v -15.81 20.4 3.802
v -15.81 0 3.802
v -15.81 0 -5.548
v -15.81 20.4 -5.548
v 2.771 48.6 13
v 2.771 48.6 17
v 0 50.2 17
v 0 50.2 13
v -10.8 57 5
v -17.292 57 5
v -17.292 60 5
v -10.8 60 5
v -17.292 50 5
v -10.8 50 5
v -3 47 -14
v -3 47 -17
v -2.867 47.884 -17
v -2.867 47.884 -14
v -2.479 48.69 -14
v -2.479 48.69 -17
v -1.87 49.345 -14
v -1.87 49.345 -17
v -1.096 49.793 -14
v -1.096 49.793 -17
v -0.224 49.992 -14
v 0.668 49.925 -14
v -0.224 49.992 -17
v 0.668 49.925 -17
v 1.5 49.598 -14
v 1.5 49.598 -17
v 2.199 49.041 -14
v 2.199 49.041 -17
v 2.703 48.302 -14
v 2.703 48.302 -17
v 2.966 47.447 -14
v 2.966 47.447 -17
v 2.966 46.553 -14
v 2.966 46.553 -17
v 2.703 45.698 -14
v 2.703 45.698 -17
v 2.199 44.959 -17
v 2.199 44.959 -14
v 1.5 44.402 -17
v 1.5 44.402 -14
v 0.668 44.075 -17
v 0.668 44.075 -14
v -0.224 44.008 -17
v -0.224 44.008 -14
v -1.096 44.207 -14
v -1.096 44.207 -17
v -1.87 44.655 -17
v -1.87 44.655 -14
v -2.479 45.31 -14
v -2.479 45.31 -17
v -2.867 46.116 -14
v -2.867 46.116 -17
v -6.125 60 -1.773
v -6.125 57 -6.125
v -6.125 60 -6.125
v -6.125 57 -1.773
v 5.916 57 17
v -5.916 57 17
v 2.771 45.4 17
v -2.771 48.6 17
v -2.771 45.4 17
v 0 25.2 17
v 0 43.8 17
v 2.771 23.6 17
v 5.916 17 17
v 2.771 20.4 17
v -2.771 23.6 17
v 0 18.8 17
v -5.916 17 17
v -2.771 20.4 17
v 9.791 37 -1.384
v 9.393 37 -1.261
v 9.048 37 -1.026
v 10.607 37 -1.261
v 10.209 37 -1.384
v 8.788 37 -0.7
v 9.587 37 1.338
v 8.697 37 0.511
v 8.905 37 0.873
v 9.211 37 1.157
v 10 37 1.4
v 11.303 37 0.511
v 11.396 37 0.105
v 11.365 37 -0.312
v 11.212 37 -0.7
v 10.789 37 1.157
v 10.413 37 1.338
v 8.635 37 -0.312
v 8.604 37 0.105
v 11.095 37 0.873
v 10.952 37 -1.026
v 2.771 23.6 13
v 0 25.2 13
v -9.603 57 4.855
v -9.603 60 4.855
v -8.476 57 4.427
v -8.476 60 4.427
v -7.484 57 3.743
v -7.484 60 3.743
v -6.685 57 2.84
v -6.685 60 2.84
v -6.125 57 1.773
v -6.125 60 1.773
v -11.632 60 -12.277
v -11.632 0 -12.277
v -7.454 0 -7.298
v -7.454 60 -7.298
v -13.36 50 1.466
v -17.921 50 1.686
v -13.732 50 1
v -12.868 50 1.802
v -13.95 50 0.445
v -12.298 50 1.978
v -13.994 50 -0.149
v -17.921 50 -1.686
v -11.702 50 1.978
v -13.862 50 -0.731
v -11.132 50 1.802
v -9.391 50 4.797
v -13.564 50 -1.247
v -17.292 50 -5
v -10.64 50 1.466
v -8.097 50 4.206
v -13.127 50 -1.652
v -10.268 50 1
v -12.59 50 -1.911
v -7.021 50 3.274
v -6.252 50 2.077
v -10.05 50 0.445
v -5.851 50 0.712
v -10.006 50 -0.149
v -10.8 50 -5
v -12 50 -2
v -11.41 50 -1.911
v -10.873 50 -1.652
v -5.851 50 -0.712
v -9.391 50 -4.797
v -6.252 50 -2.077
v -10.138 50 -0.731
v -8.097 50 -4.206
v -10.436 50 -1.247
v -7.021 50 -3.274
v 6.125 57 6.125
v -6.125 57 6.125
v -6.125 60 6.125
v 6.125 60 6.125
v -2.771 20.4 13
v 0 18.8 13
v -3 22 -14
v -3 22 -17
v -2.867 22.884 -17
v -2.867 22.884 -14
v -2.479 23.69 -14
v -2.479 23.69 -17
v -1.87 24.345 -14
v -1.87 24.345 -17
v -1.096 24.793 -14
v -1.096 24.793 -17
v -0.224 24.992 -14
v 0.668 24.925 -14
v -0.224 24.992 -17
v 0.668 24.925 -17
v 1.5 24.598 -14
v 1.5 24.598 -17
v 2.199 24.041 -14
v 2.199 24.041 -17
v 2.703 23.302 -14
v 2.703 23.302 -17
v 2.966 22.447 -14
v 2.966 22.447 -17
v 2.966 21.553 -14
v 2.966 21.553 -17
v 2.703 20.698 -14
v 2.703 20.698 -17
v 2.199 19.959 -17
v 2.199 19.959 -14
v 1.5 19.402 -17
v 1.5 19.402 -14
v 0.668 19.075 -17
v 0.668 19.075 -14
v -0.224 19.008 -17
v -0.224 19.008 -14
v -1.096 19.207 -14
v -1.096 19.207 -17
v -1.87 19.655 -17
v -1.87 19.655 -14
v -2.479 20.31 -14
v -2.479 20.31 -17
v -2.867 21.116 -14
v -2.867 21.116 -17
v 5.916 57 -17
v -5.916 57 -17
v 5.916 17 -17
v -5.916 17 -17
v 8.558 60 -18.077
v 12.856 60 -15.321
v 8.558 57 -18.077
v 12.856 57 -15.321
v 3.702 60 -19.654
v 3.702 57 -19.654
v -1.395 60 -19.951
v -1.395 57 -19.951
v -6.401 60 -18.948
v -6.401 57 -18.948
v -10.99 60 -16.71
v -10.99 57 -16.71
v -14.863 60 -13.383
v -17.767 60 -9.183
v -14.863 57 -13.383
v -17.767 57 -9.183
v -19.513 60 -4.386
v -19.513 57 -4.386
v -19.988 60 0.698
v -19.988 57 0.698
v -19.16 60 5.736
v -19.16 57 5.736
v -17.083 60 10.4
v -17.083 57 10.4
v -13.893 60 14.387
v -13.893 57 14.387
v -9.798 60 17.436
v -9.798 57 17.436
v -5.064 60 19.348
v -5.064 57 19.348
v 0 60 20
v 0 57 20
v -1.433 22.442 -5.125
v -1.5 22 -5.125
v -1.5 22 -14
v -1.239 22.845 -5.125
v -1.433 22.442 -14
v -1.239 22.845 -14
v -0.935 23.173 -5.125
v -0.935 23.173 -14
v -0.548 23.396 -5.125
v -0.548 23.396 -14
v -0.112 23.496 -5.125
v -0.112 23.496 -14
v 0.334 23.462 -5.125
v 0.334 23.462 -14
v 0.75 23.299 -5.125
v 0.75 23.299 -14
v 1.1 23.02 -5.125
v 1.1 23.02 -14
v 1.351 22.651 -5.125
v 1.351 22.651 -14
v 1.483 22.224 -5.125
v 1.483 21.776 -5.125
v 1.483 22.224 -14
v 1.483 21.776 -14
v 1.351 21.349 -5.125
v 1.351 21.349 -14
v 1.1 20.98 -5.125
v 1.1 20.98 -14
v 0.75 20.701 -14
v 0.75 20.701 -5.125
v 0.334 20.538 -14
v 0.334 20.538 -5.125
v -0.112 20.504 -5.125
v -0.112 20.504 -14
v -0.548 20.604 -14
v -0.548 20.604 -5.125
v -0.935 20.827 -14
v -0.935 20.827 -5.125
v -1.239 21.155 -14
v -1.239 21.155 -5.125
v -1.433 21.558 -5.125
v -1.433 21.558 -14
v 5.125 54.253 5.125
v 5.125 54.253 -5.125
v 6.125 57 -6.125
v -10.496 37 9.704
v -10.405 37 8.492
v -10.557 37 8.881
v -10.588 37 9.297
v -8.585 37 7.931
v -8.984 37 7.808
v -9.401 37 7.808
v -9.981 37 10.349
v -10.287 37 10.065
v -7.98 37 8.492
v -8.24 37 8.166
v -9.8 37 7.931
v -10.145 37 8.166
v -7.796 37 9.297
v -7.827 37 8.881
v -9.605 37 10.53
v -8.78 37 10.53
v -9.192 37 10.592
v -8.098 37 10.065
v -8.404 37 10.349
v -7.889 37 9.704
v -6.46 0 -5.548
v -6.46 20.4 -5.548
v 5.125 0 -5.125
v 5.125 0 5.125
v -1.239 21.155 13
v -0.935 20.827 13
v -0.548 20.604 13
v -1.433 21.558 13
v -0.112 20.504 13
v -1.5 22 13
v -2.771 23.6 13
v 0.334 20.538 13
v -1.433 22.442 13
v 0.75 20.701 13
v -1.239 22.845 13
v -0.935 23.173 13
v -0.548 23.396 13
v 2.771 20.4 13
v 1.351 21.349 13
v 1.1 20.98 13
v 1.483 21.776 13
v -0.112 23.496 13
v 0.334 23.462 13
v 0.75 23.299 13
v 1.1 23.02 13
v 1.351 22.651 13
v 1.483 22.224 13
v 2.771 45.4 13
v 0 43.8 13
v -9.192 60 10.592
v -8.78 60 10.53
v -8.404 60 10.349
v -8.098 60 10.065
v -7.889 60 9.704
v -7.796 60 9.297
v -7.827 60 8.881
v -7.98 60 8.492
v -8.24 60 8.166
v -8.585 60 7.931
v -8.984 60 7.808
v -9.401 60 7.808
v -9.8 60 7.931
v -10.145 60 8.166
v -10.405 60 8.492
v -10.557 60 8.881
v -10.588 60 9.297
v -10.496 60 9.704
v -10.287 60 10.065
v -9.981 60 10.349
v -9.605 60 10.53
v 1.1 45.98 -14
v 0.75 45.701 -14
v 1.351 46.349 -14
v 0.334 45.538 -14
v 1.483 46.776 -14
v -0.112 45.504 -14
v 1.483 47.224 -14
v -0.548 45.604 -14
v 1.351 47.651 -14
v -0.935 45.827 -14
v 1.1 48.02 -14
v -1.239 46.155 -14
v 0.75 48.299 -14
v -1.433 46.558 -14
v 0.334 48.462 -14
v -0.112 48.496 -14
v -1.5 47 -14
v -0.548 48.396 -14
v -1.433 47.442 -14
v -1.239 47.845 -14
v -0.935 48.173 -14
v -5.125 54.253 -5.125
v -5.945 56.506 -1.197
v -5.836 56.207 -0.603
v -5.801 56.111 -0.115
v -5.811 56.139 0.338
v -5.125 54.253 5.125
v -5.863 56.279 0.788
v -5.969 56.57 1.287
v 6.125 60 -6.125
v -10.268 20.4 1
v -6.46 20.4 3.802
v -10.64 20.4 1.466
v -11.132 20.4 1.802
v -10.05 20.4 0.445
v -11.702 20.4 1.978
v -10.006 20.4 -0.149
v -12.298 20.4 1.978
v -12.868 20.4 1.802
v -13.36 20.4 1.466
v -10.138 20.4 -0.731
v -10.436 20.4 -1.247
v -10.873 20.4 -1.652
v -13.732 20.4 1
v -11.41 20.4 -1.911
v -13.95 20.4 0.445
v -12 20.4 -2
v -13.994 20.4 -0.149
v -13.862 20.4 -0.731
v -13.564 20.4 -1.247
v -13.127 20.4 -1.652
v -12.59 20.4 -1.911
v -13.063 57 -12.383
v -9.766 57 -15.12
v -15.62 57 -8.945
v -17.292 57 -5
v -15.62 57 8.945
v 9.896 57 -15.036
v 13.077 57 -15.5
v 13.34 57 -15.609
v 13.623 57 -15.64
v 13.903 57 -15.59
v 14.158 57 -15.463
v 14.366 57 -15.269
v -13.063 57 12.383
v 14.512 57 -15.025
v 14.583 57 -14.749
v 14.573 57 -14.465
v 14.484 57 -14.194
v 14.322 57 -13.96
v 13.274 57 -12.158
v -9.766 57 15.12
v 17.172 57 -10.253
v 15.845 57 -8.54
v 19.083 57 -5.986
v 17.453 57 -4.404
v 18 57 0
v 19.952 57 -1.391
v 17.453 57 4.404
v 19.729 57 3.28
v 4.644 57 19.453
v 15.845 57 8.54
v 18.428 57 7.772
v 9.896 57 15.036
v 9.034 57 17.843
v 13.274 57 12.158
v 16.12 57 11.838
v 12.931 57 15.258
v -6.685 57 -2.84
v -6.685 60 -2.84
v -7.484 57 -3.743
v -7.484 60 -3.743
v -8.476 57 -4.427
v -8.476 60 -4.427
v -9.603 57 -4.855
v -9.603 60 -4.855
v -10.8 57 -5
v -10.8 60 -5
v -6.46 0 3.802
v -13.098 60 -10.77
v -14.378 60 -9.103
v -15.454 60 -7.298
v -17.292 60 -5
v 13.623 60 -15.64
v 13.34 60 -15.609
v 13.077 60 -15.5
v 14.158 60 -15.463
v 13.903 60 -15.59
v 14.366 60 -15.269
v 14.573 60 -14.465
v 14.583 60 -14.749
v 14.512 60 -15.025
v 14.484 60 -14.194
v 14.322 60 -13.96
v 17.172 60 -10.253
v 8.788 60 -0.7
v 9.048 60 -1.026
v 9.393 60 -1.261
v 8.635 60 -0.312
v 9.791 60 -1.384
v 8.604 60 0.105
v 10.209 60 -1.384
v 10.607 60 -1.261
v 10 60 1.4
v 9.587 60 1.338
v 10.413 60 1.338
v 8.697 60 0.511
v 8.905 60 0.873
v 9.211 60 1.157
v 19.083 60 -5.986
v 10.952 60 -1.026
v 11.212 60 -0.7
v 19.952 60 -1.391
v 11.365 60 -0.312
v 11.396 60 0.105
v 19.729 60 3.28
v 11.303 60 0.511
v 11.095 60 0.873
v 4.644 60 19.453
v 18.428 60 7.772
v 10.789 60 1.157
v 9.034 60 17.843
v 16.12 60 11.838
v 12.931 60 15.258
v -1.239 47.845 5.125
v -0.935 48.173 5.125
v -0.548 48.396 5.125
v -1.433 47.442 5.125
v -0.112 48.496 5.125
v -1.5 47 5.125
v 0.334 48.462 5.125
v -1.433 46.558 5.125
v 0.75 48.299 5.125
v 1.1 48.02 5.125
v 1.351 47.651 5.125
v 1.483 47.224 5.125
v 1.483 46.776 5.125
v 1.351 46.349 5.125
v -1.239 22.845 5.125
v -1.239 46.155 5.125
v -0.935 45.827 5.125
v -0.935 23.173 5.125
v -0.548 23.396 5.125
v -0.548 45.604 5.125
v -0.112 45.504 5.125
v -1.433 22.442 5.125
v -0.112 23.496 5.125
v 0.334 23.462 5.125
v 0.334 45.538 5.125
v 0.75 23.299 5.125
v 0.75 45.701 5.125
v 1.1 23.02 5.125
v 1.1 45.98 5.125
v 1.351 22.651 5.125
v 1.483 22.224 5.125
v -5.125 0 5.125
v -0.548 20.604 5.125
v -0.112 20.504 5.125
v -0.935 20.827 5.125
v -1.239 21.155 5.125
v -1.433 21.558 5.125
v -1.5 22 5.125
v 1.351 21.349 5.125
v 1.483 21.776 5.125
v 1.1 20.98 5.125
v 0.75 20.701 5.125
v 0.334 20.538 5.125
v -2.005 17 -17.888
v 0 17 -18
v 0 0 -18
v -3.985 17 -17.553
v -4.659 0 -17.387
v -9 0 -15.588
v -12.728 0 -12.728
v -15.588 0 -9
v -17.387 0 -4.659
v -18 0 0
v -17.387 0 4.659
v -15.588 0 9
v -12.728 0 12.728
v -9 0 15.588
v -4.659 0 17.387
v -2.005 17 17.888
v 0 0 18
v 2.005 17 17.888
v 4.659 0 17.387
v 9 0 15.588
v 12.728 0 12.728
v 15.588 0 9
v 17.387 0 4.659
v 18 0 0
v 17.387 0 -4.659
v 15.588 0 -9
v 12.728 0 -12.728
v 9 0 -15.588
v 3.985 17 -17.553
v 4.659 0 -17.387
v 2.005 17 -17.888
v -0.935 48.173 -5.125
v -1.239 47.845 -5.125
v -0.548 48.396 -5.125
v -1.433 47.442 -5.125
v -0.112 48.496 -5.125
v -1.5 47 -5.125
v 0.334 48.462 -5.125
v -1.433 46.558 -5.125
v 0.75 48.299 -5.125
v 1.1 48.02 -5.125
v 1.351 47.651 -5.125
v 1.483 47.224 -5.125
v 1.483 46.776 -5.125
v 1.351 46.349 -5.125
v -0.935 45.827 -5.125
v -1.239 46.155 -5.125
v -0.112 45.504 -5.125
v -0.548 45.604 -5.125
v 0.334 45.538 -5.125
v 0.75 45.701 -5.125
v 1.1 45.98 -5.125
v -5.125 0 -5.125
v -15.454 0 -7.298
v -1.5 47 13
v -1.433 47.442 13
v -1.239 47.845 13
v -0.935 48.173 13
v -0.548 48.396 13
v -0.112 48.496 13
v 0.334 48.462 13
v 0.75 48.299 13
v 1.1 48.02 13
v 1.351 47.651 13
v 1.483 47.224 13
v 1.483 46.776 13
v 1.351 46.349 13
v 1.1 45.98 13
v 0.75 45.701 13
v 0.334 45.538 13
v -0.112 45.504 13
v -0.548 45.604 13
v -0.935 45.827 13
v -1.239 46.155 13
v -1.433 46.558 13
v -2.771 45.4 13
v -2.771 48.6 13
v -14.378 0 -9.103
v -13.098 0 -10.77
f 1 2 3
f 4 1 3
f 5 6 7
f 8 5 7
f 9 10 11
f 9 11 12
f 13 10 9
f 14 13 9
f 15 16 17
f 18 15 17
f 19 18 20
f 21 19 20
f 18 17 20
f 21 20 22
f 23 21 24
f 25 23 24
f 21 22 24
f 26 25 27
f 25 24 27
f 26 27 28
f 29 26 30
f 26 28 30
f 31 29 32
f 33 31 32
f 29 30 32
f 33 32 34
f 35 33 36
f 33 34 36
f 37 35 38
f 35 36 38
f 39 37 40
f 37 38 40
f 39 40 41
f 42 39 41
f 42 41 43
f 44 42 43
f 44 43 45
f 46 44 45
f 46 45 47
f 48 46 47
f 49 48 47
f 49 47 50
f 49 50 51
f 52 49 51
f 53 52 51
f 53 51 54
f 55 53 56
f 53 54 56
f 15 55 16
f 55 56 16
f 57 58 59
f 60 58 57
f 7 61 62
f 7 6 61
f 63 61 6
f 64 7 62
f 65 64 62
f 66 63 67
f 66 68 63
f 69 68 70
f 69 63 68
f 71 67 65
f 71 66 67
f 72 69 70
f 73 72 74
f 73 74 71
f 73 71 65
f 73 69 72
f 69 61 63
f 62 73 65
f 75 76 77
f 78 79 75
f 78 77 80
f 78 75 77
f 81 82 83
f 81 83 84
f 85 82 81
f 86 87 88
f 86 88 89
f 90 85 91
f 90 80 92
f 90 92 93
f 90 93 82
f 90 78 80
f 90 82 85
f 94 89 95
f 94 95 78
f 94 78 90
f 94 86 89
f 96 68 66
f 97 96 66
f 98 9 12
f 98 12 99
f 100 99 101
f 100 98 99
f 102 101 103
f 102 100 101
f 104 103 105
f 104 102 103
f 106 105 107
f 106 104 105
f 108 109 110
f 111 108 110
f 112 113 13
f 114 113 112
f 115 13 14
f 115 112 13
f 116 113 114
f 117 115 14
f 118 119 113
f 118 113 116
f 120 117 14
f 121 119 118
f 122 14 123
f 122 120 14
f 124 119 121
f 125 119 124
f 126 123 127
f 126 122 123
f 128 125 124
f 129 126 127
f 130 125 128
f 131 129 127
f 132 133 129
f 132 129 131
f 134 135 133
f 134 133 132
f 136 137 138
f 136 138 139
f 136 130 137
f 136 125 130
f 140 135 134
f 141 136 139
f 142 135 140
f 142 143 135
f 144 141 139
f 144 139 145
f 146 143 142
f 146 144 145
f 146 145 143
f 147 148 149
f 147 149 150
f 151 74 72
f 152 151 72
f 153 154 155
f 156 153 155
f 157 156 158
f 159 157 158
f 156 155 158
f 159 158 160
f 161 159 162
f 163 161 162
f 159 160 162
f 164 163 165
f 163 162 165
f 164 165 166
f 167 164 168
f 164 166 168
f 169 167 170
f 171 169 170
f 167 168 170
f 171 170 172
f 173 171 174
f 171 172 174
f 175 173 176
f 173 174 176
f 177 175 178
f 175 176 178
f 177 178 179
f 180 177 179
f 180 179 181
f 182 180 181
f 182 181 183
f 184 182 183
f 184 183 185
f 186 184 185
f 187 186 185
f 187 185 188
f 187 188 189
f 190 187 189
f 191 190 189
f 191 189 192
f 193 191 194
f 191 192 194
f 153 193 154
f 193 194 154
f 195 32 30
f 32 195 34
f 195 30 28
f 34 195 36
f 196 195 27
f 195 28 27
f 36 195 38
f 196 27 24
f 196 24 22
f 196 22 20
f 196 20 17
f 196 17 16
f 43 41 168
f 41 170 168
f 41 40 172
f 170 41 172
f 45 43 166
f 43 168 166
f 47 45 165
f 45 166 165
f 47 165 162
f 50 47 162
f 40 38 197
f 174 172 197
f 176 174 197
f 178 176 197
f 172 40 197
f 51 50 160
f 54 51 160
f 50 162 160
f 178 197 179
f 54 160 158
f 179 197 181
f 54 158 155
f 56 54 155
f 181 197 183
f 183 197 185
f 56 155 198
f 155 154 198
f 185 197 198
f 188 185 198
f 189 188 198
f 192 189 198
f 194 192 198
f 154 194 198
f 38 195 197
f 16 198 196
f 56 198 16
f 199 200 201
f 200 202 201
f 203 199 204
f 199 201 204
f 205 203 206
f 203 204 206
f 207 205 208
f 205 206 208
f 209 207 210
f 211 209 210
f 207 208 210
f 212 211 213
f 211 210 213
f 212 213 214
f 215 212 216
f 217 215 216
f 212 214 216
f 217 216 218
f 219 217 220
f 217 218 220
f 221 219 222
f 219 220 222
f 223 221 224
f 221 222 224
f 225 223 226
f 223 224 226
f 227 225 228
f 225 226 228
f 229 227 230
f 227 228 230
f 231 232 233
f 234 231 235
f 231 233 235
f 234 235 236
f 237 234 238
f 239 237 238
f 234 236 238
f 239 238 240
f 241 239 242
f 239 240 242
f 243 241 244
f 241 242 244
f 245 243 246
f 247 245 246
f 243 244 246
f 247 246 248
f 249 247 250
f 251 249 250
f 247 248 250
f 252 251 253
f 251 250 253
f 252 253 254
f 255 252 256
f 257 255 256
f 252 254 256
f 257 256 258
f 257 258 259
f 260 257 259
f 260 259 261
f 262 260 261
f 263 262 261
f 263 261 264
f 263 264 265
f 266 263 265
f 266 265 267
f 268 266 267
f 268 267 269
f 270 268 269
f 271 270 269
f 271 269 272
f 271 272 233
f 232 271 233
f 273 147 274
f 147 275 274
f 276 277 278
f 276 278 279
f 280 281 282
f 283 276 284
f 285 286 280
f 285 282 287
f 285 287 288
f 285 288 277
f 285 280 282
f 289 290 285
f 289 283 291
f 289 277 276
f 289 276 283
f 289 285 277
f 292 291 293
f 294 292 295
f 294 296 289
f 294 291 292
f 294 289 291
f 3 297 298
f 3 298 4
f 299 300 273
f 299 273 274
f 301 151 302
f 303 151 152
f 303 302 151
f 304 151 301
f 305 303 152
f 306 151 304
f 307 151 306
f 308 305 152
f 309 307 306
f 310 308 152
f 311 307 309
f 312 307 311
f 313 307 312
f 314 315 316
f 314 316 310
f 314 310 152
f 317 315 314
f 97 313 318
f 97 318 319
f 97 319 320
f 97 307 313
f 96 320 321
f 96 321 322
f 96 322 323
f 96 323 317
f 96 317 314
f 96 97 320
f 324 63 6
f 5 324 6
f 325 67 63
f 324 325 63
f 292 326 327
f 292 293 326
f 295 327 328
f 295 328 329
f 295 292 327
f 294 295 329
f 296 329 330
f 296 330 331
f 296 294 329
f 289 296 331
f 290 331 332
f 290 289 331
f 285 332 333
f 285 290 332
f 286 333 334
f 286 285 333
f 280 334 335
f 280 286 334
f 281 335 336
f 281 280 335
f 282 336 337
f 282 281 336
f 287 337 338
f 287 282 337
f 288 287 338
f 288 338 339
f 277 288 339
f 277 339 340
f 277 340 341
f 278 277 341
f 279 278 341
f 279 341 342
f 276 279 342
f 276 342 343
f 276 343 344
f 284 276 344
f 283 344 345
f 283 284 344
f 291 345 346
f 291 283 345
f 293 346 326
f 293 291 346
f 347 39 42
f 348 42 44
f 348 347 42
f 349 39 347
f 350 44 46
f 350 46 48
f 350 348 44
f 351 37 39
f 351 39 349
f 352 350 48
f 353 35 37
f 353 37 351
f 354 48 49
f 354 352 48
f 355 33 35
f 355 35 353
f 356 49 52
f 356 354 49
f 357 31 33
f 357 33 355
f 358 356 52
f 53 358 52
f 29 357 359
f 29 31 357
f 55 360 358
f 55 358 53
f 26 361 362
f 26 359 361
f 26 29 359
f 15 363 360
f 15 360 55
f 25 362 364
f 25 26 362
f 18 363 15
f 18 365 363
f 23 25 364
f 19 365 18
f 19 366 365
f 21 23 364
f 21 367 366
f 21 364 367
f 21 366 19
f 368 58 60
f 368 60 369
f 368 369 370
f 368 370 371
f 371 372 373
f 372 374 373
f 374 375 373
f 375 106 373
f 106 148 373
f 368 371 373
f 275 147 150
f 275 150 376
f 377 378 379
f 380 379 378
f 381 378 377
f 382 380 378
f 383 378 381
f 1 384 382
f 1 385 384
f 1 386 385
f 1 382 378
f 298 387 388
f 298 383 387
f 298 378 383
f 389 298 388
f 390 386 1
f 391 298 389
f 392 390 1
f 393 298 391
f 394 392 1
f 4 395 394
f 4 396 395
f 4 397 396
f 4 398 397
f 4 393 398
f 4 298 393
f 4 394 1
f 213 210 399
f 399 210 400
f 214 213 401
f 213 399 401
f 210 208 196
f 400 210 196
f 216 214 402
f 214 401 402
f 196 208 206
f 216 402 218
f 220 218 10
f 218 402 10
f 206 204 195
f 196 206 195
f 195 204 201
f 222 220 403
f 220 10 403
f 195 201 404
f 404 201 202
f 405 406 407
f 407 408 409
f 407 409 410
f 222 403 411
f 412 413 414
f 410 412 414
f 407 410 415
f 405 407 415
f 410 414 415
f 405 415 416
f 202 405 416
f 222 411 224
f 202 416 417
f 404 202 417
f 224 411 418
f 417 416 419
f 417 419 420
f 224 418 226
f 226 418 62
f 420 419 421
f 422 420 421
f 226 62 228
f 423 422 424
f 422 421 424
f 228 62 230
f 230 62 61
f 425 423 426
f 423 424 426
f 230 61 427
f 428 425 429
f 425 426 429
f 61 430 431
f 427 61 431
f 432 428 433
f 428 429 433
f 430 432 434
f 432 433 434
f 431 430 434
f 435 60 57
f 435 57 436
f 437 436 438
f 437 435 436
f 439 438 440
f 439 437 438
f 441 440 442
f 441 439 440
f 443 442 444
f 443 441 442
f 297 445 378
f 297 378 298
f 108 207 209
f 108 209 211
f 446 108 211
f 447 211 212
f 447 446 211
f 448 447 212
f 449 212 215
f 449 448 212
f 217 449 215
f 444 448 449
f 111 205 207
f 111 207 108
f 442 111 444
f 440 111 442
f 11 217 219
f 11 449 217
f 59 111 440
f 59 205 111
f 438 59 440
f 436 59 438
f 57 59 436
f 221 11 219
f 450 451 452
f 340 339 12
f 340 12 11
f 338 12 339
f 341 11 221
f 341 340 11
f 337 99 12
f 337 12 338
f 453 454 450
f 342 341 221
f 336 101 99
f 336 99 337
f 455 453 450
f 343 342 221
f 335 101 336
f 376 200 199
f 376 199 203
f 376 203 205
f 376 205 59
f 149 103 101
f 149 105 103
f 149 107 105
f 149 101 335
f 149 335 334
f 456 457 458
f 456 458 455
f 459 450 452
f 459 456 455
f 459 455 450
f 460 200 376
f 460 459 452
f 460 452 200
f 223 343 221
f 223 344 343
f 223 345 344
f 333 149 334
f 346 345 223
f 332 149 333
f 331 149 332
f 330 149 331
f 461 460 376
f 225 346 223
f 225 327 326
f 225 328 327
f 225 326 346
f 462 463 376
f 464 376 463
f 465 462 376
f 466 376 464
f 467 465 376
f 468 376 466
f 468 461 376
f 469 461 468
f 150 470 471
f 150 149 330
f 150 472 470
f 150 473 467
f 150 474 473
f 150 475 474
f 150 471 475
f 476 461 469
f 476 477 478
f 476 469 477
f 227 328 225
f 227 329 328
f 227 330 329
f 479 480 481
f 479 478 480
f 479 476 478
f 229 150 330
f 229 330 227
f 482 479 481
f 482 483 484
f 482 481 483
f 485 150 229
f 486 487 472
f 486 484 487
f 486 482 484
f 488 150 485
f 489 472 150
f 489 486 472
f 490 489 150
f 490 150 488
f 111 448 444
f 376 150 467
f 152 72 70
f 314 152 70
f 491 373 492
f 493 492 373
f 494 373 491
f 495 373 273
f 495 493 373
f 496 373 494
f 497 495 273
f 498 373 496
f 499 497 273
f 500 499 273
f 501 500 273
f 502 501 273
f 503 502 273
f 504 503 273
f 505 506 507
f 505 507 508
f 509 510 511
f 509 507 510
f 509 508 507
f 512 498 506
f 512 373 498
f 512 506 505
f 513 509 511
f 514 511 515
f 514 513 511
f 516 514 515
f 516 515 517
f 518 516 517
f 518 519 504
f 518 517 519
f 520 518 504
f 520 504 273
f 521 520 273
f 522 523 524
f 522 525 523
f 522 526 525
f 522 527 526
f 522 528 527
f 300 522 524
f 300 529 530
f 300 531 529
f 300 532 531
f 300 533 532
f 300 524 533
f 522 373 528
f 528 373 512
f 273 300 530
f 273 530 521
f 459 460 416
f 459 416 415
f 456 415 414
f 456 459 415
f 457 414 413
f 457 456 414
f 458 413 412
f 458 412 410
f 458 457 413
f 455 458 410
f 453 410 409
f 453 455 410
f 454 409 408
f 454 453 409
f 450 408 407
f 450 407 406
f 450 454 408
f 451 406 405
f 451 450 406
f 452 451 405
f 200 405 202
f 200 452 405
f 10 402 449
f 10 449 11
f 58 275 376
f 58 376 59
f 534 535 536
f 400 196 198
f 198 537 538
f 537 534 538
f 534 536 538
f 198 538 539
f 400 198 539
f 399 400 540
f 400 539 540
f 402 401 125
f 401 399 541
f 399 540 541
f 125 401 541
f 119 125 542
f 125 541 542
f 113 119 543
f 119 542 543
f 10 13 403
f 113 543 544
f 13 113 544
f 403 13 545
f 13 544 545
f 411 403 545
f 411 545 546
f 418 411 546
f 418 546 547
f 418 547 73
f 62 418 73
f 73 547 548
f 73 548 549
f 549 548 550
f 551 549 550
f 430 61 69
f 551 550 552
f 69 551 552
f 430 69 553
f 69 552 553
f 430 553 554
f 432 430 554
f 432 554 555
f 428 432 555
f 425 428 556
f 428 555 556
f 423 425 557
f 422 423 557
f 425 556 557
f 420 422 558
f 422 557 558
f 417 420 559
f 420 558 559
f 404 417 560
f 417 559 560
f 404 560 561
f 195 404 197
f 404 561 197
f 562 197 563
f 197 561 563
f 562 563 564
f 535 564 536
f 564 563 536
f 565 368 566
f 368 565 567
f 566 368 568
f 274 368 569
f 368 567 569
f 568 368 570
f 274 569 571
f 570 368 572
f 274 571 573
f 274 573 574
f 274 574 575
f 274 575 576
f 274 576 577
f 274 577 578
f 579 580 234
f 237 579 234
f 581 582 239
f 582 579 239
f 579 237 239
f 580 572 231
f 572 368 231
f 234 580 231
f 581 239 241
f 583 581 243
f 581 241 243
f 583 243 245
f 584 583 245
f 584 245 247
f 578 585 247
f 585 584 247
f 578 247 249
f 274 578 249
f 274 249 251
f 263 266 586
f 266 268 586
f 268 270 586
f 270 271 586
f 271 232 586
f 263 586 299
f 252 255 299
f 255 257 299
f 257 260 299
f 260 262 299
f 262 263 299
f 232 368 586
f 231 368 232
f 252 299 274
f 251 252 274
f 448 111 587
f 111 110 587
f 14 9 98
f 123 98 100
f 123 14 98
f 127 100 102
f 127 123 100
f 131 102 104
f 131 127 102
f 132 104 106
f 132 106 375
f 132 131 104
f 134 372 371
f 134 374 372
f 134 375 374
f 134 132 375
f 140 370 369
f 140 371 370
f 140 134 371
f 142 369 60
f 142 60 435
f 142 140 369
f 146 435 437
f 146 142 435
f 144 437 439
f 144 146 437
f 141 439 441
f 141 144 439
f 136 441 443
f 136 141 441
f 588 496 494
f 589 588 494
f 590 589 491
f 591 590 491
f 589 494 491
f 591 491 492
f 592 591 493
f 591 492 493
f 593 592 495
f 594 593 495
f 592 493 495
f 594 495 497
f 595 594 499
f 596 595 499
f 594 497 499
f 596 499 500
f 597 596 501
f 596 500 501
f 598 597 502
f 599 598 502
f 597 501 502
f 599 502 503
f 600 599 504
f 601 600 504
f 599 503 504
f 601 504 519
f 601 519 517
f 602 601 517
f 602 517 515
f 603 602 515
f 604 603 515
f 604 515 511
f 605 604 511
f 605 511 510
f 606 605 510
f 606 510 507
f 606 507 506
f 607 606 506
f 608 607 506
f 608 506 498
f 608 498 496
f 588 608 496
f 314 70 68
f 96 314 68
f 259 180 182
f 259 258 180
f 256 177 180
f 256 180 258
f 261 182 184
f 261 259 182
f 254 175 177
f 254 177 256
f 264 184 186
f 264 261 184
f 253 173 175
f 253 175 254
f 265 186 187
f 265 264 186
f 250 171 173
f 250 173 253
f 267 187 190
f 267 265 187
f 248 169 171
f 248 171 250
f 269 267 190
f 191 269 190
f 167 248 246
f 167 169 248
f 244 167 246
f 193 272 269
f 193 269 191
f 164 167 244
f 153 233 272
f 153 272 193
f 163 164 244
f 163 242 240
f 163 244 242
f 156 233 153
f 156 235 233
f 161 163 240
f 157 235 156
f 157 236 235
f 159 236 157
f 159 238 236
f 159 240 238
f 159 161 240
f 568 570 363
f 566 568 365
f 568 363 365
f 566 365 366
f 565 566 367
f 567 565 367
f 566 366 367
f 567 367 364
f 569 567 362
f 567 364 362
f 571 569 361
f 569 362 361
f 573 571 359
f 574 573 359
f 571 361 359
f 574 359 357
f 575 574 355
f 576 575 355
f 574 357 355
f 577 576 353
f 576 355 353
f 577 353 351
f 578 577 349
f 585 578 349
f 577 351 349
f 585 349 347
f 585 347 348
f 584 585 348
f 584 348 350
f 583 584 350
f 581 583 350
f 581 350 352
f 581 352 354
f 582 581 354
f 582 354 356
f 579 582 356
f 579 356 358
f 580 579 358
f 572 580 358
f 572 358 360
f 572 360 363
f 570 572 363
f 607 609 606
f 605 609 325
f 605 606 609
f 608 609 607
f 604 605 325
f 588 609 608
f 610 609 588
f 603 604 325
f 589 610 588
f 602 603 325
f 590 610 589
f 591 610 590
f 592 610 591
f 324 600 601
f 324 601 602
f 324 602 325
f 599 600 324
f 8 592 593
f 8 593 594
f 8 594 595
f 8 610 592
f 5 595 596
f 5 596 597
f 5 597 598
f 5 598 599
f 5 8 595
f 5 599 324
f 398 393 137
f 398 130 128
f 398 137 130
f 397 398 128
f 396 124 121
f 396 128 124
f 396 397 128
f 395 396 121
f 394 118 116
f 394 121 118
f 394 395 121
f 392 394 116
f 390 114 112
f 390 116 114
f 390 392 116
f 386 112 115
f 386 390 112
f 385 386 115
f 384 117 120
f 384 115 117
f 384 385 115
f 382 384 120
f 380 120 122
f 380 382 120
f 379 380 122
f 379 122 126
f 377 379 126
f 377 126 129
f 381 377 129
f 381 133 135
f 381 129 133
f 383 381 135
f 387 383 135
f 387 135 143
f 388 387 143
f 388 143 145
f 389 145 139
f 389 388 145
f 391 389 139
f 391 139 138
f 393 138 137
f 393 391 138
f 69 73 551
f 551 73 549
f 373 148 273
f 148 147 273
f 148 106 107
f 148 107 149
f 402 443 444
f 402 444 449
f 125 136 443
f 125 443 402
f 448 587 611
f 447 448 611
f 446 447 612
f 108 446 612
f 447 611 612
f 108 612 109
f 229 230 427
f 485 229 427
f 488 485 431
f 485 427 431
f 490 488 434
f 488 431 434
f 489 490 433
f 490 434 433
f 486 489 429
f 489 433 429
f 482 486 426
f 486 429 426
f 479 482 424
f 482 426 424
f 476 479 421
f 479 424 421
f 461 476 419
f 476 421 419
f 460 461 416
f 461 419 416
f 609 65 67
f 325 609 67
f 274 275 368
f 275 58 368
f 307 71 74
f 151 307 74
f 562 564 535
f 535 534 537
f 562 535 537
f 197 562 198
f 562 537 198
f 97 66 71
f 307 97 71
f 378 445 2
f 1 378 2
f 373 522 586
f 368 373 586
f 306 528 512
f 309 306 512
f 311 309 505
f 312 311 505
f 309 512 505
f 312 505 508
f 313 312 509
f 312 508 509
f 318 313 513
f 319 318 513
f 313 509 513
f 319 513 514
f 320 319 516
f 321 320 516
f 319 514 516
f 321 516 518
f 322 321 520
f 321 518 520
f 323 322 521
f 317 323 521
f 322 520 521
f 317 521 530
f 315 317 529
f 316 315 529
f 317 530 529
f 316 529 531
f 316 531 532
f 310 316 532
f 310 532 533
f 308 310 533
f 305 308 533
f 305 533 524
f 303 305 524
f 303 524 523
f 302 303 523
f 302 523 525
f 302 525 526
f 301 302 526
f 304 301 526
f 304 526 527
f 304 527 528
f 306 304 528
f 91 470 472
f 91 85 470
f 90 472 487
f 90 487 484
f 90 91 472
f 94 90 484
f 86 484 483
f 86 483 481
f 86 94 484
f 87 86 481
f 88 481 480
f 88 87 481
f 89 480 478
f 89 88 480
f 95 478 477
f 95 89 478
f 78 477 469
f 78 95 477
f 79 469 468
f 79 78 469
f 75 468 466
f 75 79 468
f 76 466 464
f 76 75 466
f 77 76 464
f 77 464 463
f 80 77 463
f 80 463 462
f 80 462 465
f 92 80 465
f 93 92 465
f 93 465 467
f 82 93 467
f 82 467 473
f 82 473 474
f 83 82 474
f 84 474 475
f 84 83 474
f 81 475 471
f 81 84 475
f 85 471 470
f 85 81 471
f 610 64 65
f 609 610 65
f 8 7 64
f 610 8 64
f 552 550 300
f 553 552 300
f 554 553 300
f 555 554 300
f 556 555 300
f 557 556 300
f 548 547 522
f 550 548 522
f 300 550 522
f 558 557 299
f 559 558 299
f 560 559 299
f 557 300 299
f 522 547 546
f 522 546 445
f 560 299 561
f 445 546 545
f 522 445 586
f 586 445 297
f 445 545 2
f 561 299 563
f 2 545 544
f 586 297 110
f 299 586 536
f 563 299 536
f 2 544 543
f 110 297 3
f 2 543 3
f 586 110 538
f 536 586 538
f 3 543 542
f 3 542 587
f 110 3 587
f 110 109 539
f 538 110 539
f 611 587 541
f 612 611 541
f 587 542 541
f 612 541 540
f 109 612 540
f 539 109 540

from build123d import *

# Parameters (mm, degrees)
SKETCH1_R           = 18
SKETCH1_R_2         = 2
SKETCH1_W           = 10.25
SKETCH1_H           = 10.25
BOSS_EXTRUDE1_DEPTH = 57
CUT_EXTRUDE1_START  = -7
CUT_EXTRUDE1_DEPTH  = 7
SKETCH4_W           = 9.35
SKETCH4_H           = 9.35
CUT_EXTRUDE3_DEPTH  = 20.4
CUT_EXTRUDE4_START  = -40
CUT_EXTRUDE4_DEPTH  = 40
SKETCH6_R           = 1.5
CUT_EXTRUDE5_DEPTH  = 70.267597042
SKETCH7_R           = 3
CUT_EXTRUDE6_DEPTH  = 3
CUT_EXTRUDE7_DEPTH  = 4
CHAMFER1_SIZE       = 1
CHAMFER1_SIZE_2     = 2.747477419
CUT_EXTRUDE8_DEPTH  = 63.42595614
SKETCH12_R          = 1.4
CUT_EXTRUDE10_DEPTH = 20
SKETCH13_R          = 20
SKETCH13_R_2        = 1.4
BOSS_EXTRUDE2_DEPTH = 3
BOSS_EXTRUDE3_DEPTH = 3


with BuildPart() as part:
    # Sketch1 → Boss-Extrude1 (new body)
    with BuildSketch(Plane(origin=(0, 0, 0), x_dir=(1, 0, 0), z_dir=(0, 1, 0))):
        with Locations(Location((0, 0, 0), (0, 0, 90))):
            Circle(SKETCH1_R)
        with Locations(Location((-12, 0, 0), (0, 0, 90))):
            Circle(SKETCH1_R_2, mode=Mode.SUBTRACT)
        Rectangle(SKETCH1_W, SKETCH1_H, mode=Mode.SUBTRACT)
    extrude(amount=BOSS_EXTRUDE1_DEPTH)

    # Sketch2 → Cut-Extrude1 (cut)
    with BuildSketch(Plane(origin=(0, 57, 0), x_dir=(1, 0, 0), z_dir=(0, 1, 0)).offset(CUT_EXTRUDE1_START)):
        with BuildLine():
            Line((-10.8, 5), (-17.291616466, 5))
            ThreePointArc((-17.291616466, 5), (-18, 0), (-17.291616466, -5))
            Line((-17.291616466, -5), (-10.8, -5))
            ThreePointArc((-10.8, -5), (-5.8, 0), (-10.8, 5))
        make_face()
    extrude(amount=CUT_EXTRUDE1_DEPTH, mode=Mode.SUBTRACT)

    # Sketch4 → Cut-Extrude3 (cut)
    with BuildSketch(Plane(origin=(0, 0, 0), x_dir=(-1, 0, 0), z_dir=(0, -1, 0))):
        with Locations((11.135393506, 0.872889968)):
            Rectangle(SKETCH4_W, SKETCH4_H)
    extrude(amount=-CUT_EXTRUDE3_DEPTH, mode=Mode.SUBTRACT)

    # Sketch5 → Cut-Extrude4 (cut)
    with BuildSketch(Plane(origin=(0, 57, 0), x_dir=(1, 0, 0), z_dir=(0, 1, 0)).offset(CUT_EXTRUDE4_START)):
        with BuildLine():
            Line((5.916079783, 17), (-5.916079783, 17))
            ThreePointArc((-5.916079783, 17), (0, 18), (5.916079783, 17))
        make_face()
        with BuildLine():
            Line((5.916079783, -17), (-5.916079783, -17))
            ThreePointArc((-5.916079783, -17), (0, -18), (5.916079783, -17))
        make_face()
    extrude(amount=CUT_EXTRUDE4_DEPTH, mode=Mode.SUBTRACT)

    # Sketch6 → Cut-Extrude5 (cut, through all)
    with BuildSketch(Plane(origin=(0, 0, -17), x_dir=(-1, 0, 0), z_dir=(0, 0, -1))):
        with Locations((0, 47)):
            Circle(SKETCH6_R)
        with Locations((0, 22)):
            Circle(SKETCH6_R)
    extrude(amount=-CUT_EXTRUDE5_DEPTH, mode=Mode.SUBTRACT)

    # Sketch7 → Cut-Extrude6 (cut)
    with BuildSketch(Plane(origin=(0, 0, -17), x_dir=(-1, 0, 0), z_dir=(0, 0, -1))):
        with Locations((0, 47)):
            Circle(SKETCH7_R)
        with Locations((0, 22)):
            Circle(SKETCH7_R)
    extrude(amount=-CUT_EXTRUDE6_DEPTH, mode=Mode.SUBTRACT)

    # Sketch8 → Cut-Extrude7 (cut)
    with BuildSketch(Plane.XY.offset(17)):
        Polygon((0, 43.8), (2.771281292, 45.4), (2.771281292, 48.6), (0, 50.2), (-2.771281292, 48.6), (-2.771281292, 45.4), align=None)
        Polygon((0, 18.8), (2.771281292, 20.4), (2.771281292, 23.6), (0, 25.2), (-2.771281292, 23.6), (-2.771281292, 20.4), align=None)
    extrude(amount=-CUT_EXTRUDE7_DEPTH, mode=Mode.SUBTRACT)

    # Chamfer1
    # the kernel refuses this chamfer: 2.747477419, 1 mm, written as the material it takes off along each edge
    with BuildSketch(Plane(origin=(-5.125, 57, -5.125), x_dir=(0, 0.09904090225204956, -0.9950833631817488), z_dir=(1, 0, 0)), Plane(origin=(-5.125, 57, 5.125), x_dir=(-0.9950833631817488, 0.09904090225204956, 0), z_dir=(0, 0, -1)), Plane(origin=(5.125, 57, 5.125), x_dir=(0, 0.09904090225204956, 0.9950833631817488), z_dir=(-1, 0, 0)), Plane(origin=(5.125, 57, -5.125), x_dir=(0.9950833631817488, 0.09904090225204956, 0), z_dir=(0, 0, 1))) as chamfer1_piece_1:
        Polygon((CHAMFER1_SIZE * 0.995083363182, -CHAMFER1_SIZE * 0.099040902252), (-CHAMFER1_SIZE_2 * 0.0990409022684, -CHAMFER1_SIZE_2 * 0.995083363346), (0, 0), align=None)
    extrude(amount=10.25, mode=Mode.SUBTRACT)
    with BuildSketch(Plane(origin=(-5.125, 57, 5.125), x_dir=(-0.9950833631817488, 0.09904090225204956, 0), z_dir=(0, 0, -1))) as chamfer1_piece_2a_section:
        Polygon((CHAMFER1_SIZE * 0.995083363182, -CHAMFER1_SIZE * 0.099040902252), (-CHAMFER1_SIZE_2 * 0.0990409022684, -CHAMFER1_SIZE_2 * 0.995083363346), (0, 0), align=None)
    chamfer1_piece_2a = extrude(amount=17.377491449, mode=Mode.PRIVATE)
    chamfer1_piece_2a = split(chamfer1_piece_2a, bisect_by=Plane(origin=(-5.432505006, 56.059901151, -5.125), z_dir=(0, 0, -1)), keep=Keep.TOP, mode=Mode.PRIVATE)
    with BuildSketch(Plane(origin=(-12.252491449, 57, -5.125), x_dir=(0, 0.09904090225204956, -0.9950833631817488), z_dir=(1, 0, 0))) as chamfer1_piece_2b_section:
        Polygon((CHAMFER1_SIZE * 0.995083363182, -CHAMFER1_SIZE * 0.099040902252), (-CHAMFER1_SIZE_2 * 0.0990409022684, -CHAMFER1_SIZE_2 * 0.995083363346), (0, 0), align=None)
    chamfer1_piece_2b = extrude(amount=17.377491449, mode=Mode.PRIVATE)
    chamfer1_piece_2b = split(chamfer1_piece_2b, bisect_by=Plane(origin=(-5.125, 56.059901151, -5.432505006), z_dir=(-1, 0, 0)), keep=Keep.TOP, mode=Mode.PRIVATE)
    chamfer1_piece_2 = chamfer1_piece_2a & chamfer1_piece_2b
    add(chamfer1_piece_2, mode=Mode.SUBTRACT)
    with BuildSketch(Plane(origin=(5.125, 57, -12.252491449), x_dir=(0.9950833631817488, 0.09904090225204956, 0), z_dir=(0, 0, 1))) as chamfer1_piece_3a_section:
        Polygon((CHAMFER1_SIZE * 0.995083363182, -CHAMFER1_SIZE * 0.099040902252), (-CHAMFER1_SIZE_2 * 0.0990409022684, -CHAMFER1_SIZE_2 * 0.995083363346), (0, 0), align=None)
    chamfer1_piece_3a = extrude(amount=17.377491449, mode=Mode.PRIVATE)
    chamfer1_piece_3a = split(chamfer1_piece_3a, bisect_by=Plane(origin=(5.432505006, 56.059901151, -5.125), z_dir=(0, 0, -1)), keep=Keep.TOP, mode=Mode.PRIVATE)
    with BuildSketch(Plane(origin=(-5.125, 57, -5.125), x_dir=(0, 0.09904090225204956, -0.9950833631817488), z_dir=(1, 0, 0))) as chamfer1_piece_3b_section:
        Polygon((CHAMFER1_SIZE * 0.995083363182, -CHAMFER1_SIZE * 0.099040902252), (-CHAMFER1_SIZE_2 * 0.0990409022684, -CHAMFER1_SIZE_2 * 0.995083363346), (0, 0), align=None)
    chamfer1_piece_3b = extrude(amount=17.377491449, mode=Mode.PRIVATE)
    chamfer1_piece_3b = split(chamfer1_piece_3b, bisect_by=Plane(origin=(5.125, 56.059901151, -5.432505006), z_dir=(1, 0, 0)), keep=Keep.TOP, mode=Mode.PRIVATE)
    chamfer1_piece_3 = chamfer1_piece_3a & chamfer1_piece_3b
    add(chamfer1_piece_3, mode=Mode.SUBTRACT)
    with BuildSketch(Plane(origin=(5.125, 57, 5.125), x_dir=(0, 0.09904090225204956, 0.9950833631817488), z_dir=(-1, 0, 0))) as chamfer1_piece_4a_section:
        Polygon((CHAMFER1_SIZE * 0.995083363182, -CHAMFER1_SIZE * 0.099040902252), (-CHAMFER1_SIZE_2 * 0.0990409022684, -CHAMFER1_SIZE_2 * 0.995083363346), (0, 0), align=None)
    chamfer1_piece_4a = extrude(amount=17.377491449, mode=Mode.PRIVATE)
    chamfer1_piece_4a = split(chamfer1_piece_4a, bisect_by=Plane(origin=(-5.125, 56.059901151, 5.432505006), z_dir=(-1, 0, 0)), keep=Keep.TOP, mode=Mode.PRIVATE)
    with BuildSketch(Plane(origin=(-5.125, 57, 12.252491449), x_dir=(-0.9950833631817488, 0.09904090225204956, 0), z_dir=(0, 0, -1))) as chamfer1_piece_4b_section:
        Polygon((CHAMFER1_SIZE * 0.995083363182, -CHAMFER1_SIZE * 0.099040902252), (-CHAMFER1_SIZE_2 * 0.0990409022684, -CHAMFER1_SIZE_2 * 0.995083363346), (0, 0), align=None)
    chamfer1_piece_4b = extrude(amount=17.377491449, mode=Mode.PRIVATE)
    chamfer1_piece_4b = split(chamfer1_piece_4b, bisect_by=Plane(origin=(-5.432505006, 56.059901151, 5.125), z_dir=(0, 0, 1)), keep=Keep.TOP, mode=Mode.PRIVATE)
    chamfer1_piece_4 = chamfer1_piece_4a & chamfer1_piece_4b
    add(chamfer1_piece_4, mode=Mode.SUBTRACT)
    with BuildSketch(Plane(origin=(12.252491449, 57, 5.125), x_dir=(0, 0.09904090225204956, 0.9950833631817488), z_dir=(-1, 0, 0))) as chamfer1_piece_5a_section:
        Polygon((CHAMFER1_SIZE * 0.995083363182, -CHAMFER1_SIZE * 0.099040902252), (-CHAMFER1_SIZE_2 * 0.0990409022684, -CHAMFER1_SIZE_2 * 0.995083363346), (0, 0), align=None)
    chamfer1_piece_5a = extrude(amount=17.377491449, mode=Mode.PRIVATE)
    chamfer1_piece_5a = split(chamfer1_piece_5a, bisect_by=Plane(origin=(5.125, 56.059901151, 5.432505006), z_dir=(1, 0, 0)), keep=Keep.TOP, mode=Mode.PRIVATE)
    with BuildSketch(Plane(origin=(5.125, 57, -5.125), x_dir=(0.9950833631817488, 0.09904090225204956, 0), z_dir=(0, 0, 1))) as chamfer1_piece_5b_section:
        Polygon((CHAMFER1_SIZE * 0.995083363182, -CHAMFER1_SIZE * 0.099040902252), (-CHAMFER1_SIZE_2 * 0.0990409022684, -CHAMFER1_SIZE_2 * 0.995083363346), (0, 0), align=None)
    chamfer1_piece_5b = extrude(amount=17.377491449, mode=Mode.PRIVATE)
    chamfer1_piece_5b = split(chamfer1_piece_5b, bisect_by=Plane(origin=(5.432505006, 56.059901151, 5.125), z_dir=(0, 0, 1)), keep=Keep.TOP, mode=Mode.PRIVATE)
    chamfer1_piece_5 = chamfer1_piece_5a & chamfer1_piece_5b
    add(chamfer1_piece_5, mode=Mode.SUBTRACT)

    # Sketch9 → Cut-Extrude8 (cut, through all)
    with BuildSketch(Plane.XZ):
        with BuildLine():
            Line((-7.454203172, -7.297889968), (-15.454203172, -7.297889968))
            ThreePointArc((-15.454203172, -7.297889968), (-13.761984914, -9.955415688), (-11.632322635, -12.277178848))
            Line((-11.632322635, -12.277178848), (-7.454203172, -7.297889968))
        make_face()
    extrude(amount=-CUT_EXTRUDE8_DEPTH, mode=Mode.SUBTRACT)

    # Sketch12 → Cut-Extrude10 (cut)
    with BuildSketch(Plane(origin=(0, 57, 0), x_dir=(1, 0, 0), z_dir=(0, 1, 0))):
        with Locations(Location((10, 0, 0), (0, 0, 270))):
            Circle(SKETCH12_R)
        with Locations(Location((-9.192388155, -9.192388155, 0), (0, 0, 270))):
            Circle(SKETCH12_R)
    extrude(amount=-CUT_EXTRUDE10_DEPTH, mode=Mode.SUBTRACT)

    # Sketch13 → Boss-Extrude2 (add)
    with BuildSketch(Plane(origin=(0, 57, 0), x_dir=(1, 0, 0), z_dir=(0, 1, 0))):
        with Locations(Location((0, 0, 0), (0, 0, 270))):
            Circle(SKETCH13_R)
        with Locations(Location((10, 0, 0), (0, 0, 270))):
            Circle(SKETCH13_R_2, mode=Mode.SUBTRACT)
        with Locations(Location((-9.192388155, -9.192388155, 0), (0, 0, 270))):
            Circle(SKETCH13_R_2, mode=Mode.SUBTRACT)
        with BuildLine():
            Line((-10.8, 5), (-17.291616466, 5))
            Line((-17.291616466, 5), (-17.291616466, -5))
            Line((-17.291616466, -5), (-10.8, -5))
            ThreePointArc((-10.8, -5), (-7.959770503, -4.114984375), (-6.125, -1.773238563))
            Line((-6.125, -1.773238563), (-6.125, -6.125))
            Line((-6.125, -6.125), (6.125, -6.125))
            Line((6.125, -6.125), (6.125, 6.125))
            Line((6.125, 6.125), (-6.125, 6.125))
            Line((-6.125, 6.125), (-6.125, 1.773238563))
            ThreePointArc((-6.125, 1.773238563), (-7.959770503, 4.114984375), (-10.8, 5))
        make_face(mode=Mode.SUBTRACT)
        with BuildLine():
            Line((-7.454203172, 7.297889968), (-15.454203172, 7.297889968))
            ThreePointArc((-15.454203172, 7.297889968), (-13.761984914, 9.955415688), (-11.632322635, 12.277178848))
            Line((-11.632322635, 12.277178848), (-7.454203172, 7.297889968))
        make_face(mode=Mode.SUBTRACT)
    extrude(amount=BOSS_EXTRUDE2_DEPTH)

    # Sketch14 → Boss-Extrude3 (add)
    with BuildSketch(Plane(origin=(0, 60, 0), x_dir=(1, 0, 0), z_dir=(0, 1, 0))):
        with BuildLine():
            Line((12.855752194, 15.320888862), (14.321646009, 13.960317173))
            ThreePointArc((14.321646009, 13.960317173), (14.268984946, 15.373549926), (12.855752194, 15.320888862))
        make_face()
    extrude(amount=-BOSS_EXTRUDE3_DEPTH)


solid = part.part
